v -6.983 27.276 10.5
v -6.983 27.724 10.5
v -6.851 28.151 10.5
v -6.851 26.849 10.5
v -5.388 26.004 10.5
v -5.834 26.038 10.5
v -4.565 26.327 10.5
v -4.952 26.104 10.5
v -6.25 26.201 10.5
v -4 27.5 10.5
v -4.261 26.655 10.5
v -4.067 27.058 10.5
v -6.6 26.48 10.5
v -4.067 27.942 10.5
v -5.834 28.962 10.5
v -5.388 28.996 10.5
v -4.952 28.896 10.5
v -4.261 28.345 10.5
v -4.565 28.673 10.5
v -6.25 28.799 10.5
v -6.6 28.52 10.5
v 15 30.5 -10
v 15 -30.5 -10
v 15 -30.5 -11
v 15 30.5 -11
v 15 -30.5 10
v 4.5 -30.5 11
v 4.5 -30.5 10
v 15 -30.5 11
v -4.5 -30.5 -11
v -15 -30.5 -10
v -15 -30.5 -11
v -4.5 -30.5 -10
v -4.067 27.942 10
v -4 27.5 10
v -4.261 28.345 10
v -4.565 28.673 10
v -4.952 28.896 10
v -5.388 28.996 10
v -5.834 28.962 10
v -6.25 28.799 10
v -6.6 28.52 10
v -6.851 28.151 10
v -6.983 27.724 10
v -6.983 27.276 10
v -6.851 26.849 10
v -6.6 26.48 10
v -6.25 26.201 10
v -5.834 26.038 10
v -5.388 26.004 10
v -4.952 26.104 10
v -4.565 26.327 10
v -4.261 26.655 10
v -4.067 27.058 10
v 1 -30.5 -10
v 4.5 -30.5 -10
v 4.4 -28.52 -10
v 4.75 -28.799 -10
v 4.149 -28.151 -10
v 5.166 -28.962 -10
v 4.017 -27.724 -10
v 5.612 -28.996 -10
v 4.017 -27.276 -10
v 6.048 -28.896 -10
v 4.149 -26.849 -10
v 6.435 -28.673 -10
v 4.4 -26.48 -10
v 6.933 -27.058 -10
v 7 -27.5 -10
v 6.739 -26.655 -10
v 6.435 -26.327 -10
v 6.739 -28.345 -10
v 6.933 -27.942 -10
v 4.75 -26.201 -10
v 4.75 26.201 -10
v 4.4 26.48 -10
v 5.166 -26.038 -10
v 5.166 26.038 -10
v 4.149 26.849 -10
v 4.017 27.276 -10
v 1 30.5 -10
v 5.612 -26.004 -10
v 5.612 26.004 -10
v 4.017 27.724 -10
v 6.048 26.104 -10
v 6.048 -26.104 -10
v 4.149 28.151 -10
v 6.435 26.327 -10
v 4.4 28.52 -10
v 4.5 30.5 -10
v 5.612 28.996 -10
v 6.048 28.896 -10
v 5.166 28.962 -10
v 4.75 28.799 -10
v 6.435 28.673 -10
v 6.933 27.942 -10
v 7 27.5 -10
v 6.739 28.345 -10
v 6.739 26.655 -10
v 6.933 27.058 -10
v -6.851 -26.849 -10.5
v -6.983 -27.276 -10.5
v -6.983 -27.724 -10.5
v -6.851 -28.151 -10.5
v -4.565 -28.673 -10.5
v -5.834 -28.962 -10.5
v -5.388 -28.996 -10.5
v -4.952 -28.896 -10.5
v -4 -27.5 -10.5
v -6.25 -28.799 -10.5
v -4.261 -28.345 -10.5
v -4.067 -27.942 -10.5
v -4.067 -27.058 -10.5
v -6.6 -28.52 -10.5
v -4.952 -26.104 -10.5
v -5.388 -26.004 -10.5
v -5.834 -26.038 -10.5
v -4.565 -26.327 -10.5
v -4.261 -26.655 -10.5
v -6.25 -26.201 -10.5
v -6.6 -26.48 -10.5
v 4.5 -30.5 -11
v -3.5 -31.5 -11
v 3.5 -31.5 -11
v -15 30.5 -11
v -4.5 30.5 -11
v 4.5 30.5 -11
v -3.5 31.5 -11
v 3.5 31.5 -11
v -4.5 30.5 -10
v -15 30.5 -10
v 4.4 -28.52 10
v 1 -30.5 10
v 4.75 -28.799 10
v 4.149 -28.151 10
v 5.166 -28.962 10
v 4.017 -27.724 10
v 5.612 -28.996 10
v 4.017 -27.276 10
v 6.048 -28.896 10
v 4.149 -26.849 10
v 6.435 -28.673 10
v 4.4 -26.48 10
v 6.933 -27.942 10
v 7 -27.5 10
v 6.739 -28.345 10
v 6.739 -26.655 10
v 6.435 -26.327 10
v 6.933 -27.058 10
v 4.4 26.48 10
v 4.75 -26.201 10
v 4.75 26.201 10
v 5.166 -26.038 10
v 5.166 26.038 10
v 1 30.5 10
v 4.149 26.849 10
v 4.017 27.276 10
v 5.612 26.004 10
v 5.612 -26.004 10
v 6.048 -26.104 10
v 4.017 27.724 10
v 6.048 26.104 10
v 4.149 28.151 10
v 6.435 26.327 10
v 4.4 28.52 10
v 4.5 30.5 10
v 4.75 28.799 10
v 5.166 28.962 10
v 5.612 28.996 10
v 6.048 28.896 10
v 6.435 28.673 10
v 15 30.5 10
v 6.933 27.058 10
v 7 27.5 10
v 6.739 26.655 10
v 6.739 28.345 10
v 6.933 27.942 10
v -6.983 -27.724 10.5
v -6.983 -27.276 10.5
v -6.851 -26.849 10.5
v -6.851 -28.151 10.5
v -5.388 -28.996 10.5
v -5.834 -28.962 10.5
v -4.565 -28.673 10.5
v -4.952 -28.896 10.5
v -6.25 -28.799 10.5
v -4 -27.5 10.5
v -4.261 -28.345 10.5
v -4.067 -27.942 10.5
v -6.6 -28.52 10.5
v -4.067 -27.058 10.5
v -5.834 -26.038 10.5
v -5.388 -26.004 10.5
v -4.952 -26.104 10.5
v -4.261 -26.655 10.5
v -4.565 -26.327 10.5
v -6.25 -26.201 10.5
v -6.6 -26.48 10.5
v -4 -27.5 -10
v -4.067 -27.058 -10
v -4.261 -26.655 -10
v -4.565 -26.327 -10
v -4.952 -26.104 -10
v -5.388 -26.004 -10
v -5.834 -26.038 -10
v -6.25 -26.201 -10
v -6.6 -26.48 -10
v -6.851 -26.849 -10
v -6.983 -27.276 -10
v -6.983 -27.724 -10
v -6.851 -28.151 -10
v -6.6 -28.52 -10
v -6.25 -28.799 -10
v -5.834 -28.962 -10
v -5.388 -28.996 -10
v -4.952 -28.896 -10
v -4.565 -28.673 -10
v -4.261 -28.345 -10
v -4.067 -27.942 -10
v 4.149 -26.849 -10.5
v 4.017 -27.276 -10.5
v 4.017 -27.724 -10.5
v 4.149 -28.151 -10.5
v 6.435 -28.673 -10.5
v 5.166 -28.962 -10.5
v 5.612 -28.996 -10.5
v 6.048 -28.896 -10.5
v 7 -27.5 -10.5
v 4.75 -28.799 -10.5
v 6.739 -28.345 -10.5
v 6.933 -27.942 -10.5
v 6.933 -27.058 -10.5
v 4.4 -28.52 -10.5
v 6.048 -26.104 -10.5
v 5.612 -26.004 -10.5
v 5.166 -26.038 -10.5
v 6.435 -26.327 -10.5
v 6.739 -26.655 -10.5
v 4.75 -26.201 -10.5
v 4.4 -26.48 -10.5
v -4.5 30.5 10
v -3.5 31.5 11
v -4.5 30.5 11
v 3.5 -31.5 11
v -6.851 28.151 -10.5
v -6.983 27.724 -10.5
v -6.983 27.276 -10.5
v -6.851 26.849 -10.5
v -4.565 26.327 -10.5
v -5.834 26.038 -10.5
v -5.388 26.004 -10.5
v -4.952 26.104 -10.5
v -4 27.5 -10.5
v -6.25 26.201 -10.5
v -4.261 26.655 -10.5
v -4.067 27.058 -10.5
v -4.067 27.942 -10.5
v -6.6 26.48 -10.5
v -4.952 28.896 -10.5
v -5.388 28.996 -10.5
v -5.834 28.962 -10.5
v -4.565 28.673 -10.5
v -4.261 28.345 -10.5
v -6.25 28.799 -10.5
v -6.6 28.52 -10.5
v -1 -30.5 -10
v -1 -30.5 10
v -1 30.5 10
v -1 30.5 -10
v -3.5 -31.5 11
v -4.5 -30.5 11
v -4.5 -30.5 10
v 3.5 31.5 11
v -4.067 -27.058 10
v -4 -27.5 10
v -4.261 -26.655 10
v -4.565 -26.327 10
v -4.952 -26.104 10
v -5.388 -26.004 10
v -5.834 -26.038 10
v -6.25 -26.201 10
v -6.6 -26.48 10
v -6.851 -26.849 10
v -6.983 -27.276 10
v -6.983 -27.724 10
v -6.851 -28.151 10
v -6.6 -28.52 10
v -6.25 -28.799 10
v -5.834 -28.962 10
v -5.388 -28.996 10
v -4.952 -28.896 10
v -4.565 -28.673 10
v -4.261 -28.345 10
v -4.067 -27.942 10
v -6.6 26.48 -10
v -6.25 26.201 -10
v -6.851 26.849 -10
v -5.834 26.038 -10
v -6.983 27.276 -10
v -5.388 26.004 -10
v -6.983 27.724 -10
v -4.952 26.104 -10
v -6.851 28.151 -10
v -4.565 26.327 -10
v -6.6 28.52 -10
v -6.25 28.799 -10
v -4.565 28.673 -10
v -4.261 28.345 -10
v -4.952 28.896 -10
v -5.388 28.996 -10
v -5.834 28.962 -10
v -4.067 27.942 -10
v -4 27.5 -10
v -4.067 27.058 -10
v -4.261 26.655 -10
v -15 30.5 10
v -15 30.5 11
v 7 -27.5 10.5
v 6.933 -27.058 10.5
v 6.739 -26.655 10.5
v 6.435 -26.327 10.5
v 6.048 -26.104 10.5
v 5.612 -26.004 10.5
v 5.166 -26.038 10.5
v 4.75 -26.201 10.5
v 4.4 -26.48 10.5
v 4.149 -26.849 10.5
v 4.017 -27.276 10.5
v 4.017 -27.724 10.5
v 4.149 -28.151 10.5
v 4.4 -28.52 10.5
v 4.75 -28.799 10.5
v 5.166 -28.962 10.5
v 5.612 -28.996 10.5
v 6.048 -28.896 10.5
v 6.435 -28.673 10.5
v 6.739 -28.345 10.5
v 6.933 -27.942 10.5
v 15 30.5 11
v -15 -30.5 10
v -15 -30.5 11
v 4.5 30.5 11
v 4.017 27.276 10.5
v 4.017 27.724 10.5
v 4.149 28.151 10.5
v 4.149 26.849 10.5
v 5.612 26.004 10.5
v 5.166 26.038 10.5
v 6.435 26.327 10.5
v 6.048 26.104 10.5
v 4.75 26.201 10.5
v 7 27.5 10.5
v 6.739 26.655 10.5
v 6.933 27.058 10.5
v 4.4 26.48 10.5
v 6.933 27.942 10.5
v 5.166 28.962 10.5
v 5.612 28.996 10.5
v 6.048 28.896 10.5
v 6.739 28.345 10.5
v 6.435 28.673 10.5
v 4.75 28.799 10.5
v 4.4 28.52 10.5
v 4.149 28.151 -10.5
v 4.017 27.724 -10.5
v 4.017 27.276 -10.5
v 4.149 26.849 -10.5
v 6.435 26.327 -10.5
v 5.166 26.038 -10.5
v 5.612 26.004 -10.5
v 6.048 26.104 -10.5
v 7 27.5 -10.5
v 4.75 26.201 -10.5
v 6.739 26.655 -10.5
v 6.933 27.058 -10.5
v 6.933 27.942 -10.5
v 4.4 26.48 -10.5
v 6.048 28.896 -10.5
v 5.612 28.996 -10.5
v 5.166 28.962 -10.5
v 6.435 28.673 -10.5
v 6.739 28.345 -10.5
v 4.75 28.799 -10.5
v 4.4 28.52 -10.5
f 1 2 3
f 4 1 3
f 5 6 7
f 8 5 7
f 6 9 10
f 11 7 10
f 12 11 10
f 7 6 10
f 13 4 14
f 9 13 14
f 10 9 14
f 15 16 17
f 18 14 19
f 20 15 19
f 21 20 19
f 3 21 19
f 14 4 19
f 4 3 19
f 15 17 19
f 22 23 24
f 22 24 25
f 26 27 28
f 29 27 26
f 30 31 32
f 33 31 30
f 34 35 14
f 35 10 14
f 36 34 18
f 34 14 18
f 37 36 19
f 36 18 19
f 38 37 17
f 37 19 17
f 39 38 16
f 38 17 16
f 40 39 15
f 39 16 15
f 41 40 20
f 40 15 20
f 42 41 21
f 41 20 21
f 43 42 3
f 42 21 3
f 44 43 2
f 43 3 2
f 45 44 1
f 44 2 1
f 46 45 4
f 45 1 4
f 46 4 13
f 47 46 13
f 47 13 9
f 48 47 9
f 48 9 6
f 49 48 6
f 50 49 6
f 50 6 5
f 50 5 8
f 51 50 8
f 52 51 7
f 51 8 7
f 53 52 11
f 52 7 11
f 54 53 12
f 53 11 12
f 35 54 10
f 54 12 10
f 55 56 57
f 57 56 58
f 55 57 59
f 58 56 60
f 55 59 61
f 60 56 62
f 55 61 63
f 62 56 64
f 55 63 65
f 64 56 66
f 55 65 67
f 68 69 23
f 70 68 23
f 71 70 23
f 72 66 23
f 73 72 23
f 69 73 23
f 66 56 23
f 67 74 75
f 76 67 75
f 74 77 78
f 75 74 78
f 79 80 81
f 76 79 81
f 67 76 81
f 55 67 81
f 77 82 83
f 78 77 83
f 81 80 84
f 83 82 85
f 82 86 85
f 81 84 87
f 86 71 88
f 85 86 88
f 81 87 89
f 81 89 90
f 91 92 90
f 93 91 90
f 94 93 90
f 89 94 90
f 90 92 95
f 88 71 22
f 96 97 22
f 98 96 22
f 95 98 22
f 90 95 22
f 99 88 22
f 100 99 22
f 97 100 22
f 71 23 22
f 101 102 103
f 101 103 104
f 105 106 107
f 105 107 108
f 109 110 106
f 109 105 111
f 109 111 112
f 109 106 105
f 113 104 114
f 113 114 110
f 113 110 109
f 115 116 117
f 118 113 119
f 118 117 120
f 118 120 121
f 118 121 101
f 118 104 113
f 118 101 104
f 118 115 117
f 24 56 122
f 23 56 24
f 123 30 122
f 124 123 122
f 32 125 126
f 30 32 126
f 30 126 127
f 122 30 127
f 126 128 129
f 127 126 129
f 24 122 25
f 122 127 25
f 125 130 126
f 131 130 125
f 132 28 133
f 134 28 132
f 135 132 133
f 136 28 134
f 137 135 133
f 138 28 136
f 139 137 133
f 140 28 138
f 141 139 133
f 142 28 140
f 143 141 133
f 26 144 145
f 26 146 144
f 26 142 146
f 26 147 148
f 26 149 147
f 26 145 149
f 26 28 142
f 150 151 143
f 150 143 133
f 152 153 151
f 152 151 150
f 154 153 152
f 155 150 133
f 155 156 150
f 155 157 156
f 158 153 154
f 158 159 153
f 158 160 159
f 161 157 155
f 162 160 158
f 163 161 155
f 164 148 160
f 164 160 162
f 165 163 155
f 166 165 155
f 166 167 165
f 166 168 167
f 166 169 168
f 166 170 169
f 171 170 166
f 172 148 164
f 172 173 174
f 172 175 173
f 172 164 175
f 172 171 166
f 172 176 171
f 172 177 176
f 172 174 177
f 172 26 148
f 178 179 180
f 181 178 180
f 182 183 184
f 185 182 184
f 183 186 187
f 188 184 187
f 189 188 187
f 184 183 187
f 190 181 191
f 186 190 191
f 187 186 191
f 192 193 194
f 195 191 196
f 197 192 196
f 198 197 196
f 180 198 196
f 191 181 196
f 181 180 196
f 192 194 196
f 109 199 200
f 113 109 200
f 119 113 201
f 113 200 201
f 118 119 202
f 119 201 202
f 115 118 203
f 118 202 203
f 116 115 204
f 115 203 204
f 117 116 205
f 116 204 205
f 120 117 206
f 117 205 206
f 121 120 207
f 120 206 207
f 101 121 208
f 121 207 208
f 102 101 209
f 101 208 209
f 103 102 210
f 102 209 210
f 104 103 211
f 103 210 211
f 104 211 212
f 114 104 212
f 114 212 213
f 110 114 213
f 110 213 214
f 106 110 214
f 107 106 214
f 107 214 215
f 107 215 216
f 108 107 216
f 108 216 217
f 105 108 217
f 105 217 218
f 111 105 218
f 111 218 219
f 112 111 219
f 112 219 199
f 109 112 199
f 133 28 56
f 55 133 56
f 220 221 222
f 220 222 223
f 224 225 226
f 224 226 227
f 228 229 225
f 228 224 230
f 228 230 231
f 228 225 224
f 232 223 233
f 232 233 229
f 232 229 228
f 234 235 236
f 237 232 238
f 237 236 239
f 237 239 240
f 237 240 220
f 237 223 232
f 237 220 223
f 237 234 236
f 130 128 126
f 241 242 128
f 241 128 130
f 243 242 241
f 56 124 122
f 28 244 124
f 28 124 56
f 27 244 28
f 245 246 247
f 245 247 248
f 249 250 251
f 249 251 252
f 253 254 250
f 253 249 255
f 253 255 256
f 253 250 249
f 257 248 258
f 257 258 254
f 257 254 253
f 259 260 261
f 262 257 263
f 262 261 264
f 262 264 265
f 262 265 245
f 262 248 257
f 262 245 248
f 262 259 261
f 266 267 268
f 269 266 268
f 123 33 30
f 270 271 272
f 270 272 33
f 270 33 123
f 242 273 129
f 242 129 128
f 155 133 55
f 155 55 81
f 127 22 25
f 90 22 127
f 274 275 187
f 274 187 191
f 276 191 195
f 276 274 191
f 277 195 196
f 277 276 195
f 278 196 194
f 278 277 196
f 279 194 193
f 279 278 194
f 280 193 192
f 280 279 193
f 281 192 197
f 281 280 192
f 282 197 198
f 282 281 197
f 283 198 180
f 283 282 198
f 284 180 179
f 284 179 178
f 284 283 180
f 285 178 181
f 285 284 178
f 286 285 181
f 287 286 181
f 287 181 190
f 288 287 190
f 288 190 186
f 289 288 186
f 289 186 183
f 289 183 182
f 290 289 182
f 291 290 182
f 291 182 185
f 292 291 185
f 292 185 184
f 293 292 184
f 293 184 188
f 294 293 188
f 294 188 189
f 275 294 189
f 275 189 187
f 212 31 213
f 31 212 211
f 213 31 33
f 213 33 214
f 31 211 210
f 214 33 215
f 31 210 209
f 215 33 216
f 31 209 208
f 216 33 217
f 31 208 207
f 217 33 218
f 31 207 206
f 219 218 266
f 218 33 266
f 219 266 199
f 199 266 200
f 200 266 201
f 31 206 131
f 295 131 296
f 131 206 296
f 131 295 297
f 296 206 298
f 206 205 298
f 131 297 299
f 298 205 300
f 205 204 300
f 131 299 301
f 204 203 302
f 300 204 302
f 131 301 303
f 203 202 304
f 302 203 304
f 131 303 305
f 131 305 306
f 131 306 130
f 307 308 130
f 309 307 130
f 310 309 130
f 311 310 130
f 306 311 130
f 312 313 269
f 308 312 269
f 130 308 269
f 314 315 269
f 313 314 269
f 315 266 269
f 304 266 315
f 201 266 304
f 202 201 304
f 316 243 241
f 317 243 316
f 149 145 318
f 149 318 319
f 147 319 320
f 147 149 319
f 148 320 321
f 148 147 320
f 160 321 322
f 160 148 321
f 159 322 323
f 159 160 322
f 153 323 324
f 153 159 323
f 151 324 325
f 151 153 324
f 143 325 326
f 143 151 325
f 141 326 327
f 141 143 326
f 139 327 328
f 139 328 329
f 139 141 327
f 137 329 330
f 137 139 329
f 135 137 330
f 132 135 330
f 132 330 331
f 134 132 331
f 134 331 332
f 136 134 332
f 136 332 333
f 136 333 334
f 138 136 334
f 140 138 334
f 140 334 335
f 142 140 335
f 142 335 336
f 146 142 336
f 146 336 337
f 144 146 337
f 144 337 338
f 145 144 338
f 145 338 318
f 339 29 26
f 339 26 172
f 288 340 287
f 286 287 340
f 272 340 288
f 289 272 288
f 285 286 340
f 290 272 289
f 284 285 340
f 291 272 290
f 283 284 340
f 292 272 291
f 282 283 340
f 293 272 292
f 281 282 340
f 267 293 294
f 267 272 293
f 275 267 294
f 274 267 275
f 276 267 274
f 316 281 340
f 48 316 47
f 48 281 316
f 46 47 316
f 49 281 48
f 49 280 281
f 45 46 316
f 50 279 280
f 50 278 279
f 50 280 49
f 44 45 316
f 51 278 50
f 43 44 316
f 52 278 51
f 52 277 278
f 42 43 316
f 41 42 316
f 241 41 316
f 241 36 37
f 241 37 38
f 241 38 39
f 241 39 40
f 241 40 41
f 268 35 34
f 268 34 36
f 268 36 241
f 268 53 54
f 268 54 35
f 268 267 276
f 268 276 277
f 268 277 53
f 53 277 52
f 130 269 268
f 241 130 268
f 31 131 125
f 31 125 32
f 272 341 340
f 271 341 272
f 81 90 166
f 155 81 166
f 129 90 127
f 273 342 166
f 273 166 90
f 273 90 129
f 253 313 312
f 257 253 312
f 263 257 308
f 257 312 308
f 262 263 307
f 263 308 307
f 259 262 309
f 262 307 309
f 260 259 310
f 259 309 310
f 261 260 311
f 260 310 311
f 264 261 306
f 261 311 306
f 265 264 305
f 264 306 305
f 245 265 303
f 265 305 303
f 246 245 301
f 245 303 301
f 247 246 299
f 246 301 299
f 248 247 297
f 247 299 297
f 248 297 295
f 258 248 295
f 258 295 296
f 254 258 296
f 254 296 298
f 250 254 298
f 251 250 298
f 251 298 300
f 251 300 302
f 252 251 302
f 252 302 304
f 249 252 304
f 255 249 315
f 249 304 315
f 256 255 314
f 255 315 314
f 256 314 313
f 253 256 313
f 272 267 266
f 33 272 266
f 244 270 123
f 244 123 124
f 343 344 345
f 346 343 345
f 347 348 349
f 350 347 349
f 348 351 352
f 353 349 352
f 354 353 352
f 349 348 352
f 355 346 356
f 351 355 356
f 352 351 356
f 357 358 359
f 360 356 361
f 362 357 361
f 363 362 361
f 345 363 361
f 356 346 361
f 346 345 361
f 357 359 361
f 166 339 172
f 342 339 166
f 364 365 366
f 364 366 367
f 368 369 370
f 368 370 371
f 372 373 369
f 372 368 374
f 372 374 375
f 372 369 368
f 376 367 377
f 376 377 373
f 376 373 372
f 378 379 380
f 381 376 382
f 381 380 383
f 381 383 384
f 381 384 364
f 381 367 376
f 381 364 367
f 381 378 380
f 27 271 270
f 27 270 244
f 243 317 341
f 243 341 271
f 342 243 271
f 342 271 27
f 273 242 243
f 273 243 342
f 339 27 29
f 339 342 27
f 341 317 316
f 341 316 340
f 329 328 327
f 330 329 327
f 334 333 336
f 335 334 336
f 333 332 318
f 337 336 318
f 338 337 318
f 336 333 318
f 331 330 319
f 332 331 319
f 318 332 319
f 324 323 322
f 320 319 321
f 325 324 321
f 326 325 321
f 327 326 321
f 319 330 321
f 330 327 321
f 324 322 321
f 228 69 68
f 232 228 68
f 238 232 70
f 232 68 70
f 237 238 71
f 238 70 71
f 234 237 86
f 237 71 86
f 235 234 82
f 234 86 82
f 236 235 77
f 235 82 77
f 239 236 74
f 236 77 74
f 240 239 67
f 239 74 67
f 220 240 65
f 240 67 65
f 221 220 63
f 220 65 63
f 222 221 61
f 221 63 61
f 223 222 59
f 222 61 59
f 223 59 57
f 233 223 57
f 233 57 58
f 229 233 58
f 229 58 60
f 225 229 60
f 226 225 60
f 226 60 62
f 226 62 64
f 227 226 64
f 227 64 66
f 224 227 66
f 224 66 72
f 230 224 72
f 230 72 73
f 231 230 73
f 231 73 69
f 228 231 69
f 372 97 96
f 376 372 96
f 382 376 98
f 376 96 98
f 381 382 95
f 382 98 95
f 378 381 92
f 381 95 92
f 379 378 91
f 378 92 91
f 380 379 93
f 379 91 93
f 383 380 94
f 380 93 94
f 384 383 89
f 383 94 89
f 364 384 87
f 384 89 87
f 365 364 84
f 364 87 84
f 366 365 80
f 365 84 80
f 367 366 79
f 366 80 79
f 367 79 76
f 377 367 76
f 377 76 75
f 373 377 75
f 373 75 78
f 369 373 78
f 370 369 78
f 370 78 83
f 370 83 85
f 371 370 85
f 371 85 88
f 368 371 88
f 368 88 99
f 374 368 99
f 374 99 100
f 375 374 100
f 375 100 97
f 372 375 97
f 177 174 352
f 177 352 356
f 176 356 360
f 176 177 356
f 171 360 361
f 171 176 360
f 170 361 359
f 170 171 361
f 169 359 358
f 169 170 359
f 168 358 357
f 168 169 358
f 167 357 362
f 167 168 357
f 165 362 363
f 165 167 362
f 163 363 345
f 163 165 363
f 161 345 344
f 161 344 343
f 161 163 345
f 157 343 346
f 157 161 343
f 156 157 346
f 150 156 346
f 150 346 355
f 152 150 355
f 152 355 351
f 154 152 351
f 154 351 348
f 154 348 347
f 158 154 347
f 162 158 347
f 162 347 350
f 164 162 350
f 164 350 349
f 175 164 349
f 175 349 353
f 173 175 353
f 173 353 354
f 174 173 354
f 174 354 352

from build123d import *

# Parameters (mm, degrees)
F0_R     = 1.5
F1_DEPTH = 11
F2_W     = 61
F2_H     = 1
F2_H_2   = 18
F3_DEPTH = 15
F4_DEPTH = 1
F5_DEPTH = 10.5


with BuildPart() as f1:
    # F0 (on Top) → F1 (new body, symmetric)
    with BuildSketch(Plane.XY):
        Polygon((-4.5, 30.5), (-15, 30.5), (-15, -30.5), (-4.5, -30.5), (4.5, -30.5), (15, -30.5), (15, 30.5), (4.5, 30.5), align=None)
        with Locations((-5.5, -27.5)):
            Circle(F0_R, mode=Mode.SUBTRACT)
        with Locations((5.5, -27.5)):
            Circle(F0_R, mode=Mode.SUBTRACT)
        with Locations((-5.5, 27.5)):
            Circle(F0_R, mode=Mode.SUBTRACT)
        with Locations((5.5, 27.5)):
            Circle(F0_R, mode=Mode.SUBTRACT)
        with Locations((5.5, -27.5)):
            Circle(F0_R)
        with Locations((-5.5, -27.5)):
            Circle(F0_R)
        with Locations((-5.5, 27.5)):
            Circle(F0_R)
        with Locations((5.5, 27.5)):
            Circle(F0_R)
        Polygon((-3.5, 31.5), (-4.5, 30.5), (4.5, 30.5), (3.5, 31.5), align=None)
        Polygon((4.5, -30.5), (-4.5, -30.5), (-3.5, -31.5), (3.5, -31.5), align=None)
    extrude(amount=F1_DEPTH, both=True)

    # F2 (on Right) → F3 (cut, symmetric)
    with BuildSketch(Plane.YZ):
        with Locations((0, 9.5)):
            Rectangle(F2_W, F2_H)
        Rectangle(F2_W, F2_H_2)
        with Locations((0, -9.5)):
            Rectangle(F2_W, F2_H)
    extrude(amount=F3_DEPTH, both=True, mode=Mode.SUBTRACT)

    # F2 (on Right) → F4 (join, symmetric)
    with BuildSketch(Plane.YZ):
        with Locations((0, 9.5)):
            Rectangle(F2_W, F2_H)
        Rectangle(F2_W, F2_H_2)
        with Locations((0, -9.5)):
            Rectangle(F2_W, F2_H)
    extrude(amount=F4_DEPTH, both=True)

    # F0 (on Top) → F5 (cut, symmetric)
    with BuildSketch(Plane.XY):
        with Locations((-5.5, -27.5)):
            Circle(F0_R)
        with Locations((5.5, -27.5)):
            Circle(F0_R)
        with Locations((5.5, 27.5)):
            Circle(F0_R)
        with Locations((-5.5, 27.5)):
            Circle(F0_R)
    extrude(amount=F5_DEPTH, both=True, mode=Mode.SUBTRACT)


solid = f1.part
